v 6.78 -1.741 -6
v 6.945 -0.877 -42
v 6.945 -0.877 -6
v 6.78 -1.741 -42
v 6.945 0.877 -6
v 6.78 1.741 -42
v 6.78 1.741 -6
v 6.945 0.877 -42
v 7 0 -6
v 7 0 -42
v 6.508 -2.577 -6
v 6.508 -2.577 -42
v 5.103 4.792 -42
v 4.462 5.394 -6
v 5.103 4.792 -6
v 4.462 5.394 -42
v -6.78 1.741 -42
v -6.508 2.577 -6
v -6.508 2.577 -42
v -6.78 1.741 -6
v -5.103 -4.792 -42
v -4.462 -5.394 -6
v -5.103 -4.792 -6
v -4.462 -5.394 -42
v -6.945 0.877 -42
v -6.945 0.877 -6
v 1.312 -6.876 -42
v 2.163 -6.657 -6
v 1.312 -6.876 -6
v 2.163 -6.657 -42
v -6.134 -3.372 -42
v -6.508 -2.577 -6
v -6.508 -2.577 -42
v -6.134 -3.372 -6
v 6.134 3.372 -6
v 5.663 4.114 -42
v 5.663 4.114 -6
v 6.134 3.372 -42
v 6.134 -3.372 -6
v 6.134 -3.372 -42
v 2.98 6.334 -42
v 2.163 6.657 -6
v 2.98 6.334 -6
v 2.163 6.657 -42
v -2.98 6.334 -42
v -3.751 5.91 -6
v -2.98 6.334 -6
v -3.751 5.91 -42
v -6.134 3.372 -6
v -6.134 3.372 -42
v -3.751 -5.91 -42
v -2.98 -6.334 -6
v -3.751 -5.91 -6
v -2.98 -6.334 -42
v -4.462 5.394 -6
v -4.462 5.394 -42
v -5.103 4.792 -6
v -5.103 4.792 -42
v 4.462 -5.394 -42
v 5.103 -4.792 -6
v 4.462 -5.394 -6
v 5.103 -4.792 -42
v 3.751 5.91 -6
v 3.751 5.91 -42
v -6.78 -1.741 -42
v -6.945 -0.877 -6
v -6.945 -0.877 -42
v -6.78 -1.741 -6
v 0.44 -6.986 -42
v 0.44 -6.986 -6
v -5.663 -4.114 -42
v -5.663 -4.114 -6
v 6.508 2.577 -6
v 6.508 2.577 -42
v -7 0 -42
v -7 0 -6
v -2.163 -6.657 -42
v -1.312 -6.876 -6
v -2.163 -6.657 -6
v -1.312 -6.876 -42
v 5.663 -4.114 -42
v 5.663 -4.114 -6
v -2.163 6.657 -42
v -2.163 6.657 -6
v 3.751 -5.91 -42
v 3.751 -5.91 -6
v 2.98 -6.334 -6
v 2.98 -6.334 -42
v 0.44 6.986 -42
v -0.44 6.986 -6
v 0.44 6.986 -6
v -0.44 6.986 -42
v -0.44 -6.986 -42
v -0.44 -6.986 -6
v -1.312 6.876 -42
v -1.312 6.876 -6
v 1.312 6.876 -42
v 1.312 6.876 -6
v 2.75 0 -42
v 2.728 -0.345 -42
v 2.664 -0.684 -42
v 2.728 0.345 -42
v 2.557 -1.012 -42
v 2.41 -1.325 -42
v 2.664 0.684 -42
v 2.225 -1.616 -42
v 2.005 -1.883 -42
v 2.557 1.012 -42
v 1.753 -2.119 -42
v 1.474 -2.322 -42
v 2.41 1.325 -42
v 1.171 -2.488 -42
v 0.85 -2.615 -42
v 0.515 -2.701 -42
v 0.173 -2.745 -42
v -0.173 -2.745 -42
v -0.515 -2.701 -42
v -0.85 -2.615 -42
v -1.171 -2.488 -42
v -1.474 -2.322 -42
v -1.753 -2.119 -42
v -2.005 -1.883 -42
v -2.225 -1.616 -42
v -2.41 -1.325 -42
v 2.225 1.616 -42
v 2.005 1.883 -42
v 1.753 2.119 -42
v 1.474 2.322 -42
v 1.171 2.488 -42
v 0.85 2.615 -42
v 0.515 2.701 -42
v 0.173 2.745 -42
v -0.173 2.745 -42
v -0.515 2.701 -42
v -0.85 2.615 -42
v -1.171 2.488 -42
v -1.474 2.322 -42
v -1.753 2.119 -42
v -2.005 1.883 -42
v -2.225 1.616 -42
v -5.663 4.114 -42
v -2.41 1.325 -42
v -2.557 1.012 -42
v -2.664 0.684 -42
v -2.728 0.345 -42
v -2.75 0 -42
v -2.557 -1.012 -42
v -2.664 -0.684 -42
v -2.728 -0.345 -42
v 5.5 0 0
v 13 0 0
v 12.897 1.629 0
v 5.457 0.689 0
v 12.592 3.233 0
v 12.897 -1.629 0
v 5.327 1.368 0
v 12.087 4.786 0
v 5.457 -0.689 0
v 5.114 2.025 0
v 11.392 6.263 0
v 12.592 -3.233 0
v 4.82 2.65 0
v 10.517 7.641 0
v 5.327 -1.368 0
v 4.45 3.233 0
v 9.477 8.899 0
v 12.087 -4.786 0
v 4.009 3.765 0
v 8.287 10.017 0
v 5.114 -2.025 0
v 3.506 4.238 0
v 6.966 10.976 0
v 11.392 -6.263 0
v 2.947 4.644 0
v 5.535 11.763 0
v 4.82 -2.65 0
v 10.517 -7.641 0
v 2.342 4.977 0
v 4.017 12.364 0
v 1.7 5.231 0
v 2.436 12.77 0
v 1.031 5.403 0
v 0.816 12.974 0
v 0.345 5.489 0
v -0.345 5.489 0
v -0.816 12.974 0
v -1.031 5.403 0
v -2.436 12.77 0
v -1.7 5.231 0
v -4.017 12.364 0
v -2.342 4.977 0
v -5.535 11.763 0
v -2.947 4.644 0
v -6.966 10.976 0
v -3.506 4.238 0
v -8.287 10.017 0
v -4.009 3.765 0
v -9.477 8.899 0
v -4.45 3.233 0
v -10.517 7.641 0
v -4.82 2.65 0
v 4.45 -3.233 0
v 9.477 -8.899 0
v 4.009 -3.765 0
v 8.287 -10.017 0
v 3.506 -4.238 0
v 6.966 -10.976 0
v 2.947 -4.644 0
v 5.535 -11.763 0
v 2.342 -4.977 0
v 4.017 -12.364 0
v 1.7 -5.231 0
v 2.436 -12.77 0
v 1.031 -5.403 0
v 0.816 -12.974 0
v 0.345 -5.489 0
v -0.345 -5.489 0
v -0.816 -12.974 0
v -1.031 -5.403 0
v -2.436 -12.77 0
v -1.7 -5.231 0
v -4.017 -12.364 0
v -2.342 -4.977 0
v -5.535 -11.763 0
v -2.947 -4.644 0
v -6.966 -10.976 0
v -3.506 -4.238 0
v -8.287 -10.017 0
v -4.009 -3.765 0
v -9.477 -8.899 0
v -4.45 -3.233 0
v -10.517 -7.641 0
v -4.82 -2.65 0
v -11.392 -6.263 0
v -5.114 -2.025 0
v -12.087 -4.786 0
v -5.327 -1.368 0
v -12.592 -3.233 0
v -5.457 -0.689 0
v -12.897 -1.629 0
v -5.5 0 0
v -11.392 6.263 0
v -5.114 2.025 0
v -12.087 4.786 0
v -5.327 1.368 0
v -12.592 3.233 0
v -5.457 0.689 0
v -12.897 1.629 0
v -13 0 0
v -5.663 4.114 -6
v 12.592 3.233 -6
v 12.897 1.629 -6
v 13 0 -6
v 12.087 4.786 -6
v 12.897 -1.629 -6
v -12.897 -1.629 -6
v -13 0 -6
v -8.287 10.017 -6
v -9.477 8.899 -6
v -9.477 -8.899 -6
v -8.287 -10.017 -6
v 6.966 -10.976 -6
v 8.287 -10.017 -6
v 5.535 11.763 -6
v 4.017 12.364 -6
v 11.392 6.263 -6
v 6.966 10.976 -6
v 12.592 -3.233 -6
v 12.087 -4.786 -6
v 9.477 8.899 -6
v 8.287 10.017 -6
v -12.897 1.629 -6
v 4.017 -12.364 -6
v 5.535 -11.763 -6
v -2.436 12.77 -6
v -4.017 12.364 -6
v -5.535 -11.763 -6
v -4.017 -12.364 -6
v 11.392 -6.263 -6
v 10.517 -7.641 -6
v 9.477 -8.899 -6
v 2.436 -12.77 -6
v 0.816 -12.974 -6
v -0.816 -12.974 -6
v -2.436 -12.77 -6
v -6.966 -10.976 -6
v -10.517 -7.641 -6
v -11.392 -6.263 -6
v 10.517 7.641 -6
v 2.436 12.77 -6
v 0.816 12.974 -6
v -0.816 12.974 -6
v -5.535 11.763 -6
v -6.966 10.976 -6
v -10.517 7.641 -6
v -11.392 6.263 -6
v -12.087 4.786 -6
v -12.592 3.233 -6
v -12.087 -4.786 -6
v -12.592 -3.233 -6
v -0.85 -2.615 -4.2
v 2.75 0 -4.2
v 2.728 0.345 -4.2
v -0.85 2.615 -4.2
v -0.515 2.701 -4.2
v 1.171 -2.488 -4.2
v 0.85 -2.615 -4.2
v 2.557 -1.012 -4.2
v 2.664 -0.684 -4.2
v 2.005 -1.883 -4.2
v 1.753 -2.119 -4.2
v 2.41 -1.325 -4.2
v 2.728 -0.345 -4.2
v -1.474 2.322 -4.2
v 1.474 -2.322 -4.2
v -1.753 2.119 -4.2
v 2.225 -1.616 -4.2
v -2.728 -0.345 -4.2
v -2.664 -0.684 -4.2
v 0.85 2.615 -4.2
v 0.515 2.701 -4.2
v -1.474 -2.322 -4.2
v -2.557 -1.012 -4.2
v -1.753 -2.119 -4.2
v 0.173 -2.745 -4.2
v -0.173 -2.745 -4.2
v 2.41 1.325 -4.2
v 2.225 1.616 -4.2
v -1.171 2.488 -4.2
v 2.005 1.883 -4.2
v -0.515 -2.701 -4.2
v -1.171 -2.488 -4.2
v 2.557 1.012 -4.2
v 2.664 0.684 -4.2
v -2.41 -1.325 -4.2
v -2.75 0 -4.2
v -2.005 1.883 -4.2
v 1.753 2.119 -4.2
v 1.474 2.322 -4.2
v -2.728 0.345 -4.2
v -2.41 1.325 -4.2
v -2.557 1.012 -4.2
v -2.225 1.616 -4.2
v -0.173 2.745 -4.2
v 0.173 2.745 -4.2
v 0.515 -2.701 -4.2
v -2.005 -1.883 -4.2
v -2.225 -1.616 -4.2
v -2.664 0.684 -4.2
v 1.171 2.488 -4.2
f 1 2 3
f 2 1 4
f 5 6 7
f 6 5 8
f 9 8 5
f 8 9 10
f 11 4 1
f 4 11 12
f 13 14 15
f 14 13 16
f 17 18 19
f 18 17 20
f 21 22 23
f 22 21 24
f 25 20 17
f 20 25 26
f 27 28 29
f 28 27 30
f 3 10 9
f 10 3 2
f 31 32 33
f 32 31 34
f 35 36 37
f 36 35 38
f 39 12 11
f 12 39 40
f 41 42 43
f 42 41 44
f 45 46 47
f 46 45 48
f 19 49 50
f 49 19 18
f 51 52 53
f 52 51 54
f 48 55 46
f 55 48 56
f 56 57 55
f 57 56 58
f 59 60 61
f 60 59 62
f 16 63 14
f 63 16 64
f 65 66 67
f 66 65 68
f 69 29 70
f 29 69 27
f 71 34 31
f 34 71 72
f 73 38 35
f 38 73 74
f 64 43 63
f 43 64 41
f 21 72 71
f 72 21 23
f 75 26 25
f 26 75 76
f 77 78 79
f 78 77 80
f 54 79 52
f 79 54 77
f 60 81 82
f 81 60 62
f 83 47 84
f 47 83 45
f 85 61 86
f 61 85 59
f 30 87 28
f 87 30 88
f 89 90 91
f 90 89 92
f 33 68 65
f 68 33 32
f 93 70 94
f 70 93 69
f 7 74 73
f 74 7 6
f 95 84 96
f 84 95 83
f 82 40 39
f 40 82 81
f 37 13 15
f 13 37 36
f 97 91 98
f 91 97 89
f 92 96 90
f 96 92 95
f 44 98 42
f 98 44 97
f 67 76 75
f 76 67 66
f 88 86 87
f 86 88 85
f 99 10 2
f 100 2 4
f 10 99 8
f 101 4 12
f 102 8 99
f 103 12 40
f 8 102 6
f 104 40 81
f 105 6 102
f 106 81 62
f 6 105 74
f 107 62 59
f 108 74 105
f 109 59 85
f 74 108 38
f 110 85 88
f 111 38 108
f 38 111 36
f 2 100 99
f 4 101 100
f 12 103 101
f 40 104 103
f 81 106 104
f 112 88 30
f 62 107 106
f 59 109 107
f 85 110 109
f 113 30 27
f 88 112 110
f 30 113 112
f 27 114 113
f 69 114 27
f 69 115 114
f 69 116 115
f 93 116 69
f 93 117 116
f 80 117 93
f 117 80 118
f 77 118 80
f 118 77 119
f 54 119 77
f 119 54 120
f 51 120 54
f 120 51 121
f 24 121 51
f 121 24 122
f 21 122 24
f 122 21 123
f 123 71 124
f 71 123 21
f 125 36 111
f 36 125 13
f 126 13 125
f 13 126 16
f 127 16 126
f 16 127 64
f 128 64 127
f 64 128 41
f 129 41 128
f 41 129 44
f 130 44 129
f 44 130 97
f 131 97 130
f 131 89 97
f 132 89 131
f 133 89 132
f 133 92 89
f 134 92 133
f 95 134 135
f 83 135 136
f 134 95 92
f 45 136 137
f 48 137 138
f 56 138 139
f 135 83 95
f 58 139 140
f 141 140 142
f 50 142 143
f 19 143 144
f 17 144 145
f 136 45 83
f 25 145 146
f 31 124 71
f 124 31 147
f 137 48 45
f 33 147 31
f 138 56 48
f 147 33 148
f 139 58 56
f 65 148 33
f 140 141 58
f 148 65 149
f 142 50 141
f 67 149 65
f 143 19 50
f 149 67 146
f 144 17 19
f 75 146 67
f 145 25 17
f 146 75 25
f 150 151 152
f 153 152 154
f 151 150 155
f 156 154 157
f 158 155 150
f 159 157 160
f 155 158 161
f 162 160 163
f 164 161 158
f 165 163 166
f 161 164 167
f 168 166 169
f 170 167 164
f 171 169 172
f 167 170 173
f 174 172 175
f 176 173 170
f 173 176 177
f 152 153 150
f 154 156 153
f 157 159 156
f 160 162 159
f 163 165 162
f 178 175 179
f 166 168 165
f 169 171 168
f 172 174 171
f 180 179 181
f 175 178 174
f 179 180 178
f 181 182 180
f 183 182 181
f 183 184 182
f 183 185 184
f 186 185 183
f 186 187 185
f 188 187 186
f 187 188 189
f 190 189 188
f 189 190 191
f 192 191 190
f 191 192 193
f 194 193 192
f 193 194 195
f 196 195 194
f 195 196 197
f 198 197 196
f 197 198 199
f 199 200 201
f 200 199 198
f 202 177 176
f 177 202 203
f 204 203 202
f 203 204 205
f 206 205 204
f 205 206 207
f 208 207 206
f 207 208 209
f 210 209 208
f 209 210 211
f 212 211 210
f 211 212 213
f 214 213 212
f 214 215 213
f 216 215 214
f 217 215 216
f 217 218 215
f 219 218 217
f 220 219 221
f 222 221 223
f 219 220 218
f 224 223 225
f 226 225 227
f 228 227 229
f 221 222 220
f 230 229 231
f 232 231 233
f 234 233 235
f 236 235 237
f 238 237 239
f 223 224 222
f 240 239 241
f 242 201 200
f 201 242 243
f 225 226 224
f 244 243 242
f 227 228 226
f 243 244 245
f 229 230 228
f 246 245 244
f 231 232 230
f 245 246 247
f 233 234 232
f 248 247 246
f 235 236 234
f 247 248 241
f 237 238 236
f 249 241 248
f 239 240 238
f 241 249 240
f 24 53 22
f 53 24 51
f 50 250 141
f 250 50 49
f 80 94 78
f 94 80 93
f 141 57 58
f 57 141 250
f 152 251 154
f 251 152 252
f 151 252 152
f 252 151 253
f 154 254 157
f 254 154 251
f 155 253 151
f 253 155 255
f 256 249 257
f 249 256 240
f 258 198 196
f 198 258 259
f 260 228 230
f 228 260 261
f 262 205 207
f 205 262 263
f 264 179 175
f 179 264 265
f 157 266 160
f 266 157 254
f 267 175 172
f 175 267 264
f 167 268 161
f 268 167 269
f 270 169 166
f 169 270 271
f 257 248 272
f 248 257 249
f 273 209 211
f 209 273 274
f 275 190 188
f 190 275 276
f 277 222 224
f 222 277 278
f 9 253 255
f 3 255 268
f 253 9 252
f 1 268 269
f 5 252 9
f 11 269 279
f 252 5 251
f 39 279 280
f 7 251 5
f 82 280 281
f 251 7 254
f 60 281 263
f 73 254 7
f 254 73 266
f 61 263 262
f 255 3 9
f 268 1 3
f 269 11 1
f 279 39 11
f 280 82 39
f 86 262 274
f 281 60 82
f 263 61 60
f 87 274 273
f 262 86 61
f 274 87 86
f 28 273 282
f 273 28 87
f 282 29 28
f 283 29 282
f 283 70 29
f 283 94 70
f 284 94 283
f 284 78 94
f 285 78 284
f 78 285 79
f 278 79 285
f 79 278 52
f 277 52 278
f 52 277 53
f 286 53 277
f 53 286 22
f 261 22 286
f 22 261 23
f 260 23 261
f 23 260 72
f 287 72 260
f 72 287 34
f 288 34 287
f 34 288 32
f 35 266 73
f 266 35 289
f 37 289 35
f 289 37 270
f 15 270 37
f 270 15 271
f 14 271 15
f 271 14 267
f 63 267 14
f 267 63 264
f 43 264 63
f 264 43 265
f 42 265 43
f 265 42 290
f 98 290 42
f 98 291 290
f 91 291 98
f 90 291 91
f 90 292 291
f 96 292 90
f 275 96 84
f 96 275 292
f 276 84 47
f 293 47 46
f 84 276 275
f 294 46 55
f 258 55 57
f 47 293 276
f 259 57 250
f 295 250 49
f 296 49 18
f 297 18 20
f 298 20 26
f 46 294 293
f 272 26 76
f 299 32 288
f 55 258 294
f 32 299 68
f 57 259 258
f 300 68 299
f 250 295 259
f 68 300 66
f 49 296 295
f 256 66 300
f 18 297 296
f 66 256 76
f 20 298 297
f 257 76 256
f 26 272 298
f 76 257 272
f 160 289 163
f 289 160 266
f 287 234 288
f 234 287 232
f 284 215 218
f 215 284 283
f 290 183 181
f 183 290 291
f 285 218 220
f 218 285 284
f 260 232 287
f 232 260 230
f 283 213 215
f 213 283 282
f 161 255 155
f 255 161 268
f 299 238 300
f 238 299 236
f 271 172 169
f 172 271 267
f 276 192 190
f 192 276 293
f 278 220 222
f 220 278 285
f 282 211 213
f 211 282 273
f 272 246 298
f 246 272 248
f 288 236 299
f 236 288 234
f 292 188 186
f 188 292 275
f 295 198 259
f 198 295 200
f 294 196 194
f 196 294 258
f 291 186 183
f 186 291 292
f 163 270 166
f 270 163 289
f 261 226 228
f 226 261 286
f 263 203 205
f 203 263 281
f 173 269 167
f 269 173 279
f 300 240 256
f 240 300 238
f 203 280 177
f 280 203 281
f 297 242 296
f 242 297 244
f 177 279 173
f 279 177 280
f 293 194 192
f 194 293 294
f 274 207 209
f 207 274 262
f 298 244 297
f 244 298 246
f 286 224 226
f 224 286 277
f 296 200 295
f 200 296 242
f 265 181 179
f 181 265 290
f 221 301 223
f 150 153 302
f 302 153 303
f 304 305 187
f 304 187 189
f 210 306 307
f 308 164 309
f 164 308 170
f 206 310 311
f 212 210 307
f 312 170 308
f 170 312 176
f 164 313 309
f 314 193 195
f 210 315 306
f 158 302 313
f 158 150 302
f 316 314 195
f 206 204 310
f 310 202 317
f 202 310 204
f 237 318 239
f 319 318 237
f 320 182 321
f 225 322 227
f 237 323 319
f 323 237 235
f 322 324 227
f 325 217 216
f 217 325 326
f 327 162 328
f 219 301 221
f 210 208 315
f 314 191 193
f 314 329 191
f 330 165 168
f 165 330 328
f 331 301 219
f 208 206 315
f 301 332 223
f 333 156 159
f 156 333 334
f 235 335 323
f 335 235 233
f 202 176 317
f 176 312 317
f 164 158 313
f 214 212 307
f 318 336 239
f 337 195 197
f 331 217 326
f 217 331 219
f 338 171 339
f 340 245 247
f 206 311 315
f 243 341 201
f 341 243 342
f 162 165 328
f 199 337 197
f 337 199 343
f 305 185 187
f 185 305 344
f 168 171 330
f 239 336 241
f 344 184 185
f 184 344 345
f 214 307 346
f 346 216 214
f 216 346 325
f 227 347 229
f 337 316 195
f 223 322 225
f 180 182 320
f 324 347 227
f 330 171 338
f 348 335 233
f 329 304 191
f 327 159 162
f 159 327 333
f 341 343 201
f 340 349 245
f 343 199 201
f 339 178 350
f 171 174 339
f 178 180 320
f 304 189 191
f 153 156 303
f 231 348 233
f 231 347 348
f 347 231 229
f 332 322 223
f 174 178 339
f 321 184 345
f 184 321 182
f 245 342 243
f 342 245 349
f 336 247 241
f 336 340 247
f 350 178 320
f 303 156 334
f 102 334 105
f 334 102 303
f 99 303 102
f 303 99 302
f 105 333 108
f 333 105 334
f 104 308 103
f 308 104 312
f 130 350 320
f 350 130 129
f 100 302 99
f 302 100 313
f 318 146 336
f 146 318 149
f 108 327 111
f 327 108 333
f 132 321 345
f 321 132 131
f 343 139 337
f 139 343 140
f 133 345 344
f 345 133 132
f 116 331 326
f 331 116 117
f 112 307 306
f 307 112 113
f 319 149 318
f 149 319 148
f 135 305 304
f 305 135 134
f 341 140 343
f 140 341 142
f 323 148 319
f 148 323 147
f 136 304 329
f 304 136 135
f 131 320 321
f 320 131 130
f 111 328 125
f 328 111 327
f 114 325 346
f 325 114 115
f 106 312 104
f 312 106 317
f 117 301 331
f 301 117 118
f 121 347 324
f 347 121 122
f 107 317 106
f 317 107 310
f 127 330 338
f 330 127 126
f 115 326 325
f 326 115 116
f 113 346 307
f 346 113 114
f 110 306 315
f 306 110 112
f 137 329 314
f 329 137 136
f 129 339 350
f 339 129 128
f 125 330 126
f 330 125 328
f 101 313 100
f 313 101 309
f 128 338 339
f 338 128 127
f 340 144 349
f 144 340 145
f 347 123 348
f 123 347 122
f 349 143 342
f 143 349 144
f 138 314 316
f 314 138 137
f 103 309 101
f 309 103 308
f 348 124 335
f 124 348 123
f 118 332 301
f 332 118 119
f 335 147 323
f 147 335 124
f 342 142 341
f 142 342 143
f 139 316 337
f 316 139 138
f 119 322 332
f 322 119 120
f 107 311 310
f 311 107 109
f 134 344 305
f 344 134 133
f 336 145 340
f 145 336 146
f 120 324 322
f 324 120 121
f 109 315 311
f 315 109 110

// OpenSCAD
$fn = 50;


difference() {
	union() {
		translate(v = [0, 0, -42.0000000000]) {
			cylinder(h = 42, r = 7.0000000000);
		}
		translate(v = [0, 0, -6.0000000000]) {
			cylinder(h = 6, r = 13.0000000000);
		}
	}
	union() {
		translate(v = [0, 0, 0]) {
			rotate(a = [0, 0, 0]) {
				difference() {
					union() {
						#translate(v = [0, 0, -42.0000000000]) {
							cylinder(h = 42, r = 2.2500000000);
						}
						#translate(v = [0, 0, -4.2000000000]) {
							cylinder(h = 4.2000000000, r1 = 2.7500000000, r2 = 5.5000000000);
						}
						#translate(v = [0, 0, -42.0000000000]) {
							cylinder(h = 42, r = 2.7500000000);
						}
						#translate(v = [0, 0, -42.0000000000]) {
							cylinder(h = 42, r = 2.2500000000);
						}
					}
					union();
				}
			}
		}
	}
}
